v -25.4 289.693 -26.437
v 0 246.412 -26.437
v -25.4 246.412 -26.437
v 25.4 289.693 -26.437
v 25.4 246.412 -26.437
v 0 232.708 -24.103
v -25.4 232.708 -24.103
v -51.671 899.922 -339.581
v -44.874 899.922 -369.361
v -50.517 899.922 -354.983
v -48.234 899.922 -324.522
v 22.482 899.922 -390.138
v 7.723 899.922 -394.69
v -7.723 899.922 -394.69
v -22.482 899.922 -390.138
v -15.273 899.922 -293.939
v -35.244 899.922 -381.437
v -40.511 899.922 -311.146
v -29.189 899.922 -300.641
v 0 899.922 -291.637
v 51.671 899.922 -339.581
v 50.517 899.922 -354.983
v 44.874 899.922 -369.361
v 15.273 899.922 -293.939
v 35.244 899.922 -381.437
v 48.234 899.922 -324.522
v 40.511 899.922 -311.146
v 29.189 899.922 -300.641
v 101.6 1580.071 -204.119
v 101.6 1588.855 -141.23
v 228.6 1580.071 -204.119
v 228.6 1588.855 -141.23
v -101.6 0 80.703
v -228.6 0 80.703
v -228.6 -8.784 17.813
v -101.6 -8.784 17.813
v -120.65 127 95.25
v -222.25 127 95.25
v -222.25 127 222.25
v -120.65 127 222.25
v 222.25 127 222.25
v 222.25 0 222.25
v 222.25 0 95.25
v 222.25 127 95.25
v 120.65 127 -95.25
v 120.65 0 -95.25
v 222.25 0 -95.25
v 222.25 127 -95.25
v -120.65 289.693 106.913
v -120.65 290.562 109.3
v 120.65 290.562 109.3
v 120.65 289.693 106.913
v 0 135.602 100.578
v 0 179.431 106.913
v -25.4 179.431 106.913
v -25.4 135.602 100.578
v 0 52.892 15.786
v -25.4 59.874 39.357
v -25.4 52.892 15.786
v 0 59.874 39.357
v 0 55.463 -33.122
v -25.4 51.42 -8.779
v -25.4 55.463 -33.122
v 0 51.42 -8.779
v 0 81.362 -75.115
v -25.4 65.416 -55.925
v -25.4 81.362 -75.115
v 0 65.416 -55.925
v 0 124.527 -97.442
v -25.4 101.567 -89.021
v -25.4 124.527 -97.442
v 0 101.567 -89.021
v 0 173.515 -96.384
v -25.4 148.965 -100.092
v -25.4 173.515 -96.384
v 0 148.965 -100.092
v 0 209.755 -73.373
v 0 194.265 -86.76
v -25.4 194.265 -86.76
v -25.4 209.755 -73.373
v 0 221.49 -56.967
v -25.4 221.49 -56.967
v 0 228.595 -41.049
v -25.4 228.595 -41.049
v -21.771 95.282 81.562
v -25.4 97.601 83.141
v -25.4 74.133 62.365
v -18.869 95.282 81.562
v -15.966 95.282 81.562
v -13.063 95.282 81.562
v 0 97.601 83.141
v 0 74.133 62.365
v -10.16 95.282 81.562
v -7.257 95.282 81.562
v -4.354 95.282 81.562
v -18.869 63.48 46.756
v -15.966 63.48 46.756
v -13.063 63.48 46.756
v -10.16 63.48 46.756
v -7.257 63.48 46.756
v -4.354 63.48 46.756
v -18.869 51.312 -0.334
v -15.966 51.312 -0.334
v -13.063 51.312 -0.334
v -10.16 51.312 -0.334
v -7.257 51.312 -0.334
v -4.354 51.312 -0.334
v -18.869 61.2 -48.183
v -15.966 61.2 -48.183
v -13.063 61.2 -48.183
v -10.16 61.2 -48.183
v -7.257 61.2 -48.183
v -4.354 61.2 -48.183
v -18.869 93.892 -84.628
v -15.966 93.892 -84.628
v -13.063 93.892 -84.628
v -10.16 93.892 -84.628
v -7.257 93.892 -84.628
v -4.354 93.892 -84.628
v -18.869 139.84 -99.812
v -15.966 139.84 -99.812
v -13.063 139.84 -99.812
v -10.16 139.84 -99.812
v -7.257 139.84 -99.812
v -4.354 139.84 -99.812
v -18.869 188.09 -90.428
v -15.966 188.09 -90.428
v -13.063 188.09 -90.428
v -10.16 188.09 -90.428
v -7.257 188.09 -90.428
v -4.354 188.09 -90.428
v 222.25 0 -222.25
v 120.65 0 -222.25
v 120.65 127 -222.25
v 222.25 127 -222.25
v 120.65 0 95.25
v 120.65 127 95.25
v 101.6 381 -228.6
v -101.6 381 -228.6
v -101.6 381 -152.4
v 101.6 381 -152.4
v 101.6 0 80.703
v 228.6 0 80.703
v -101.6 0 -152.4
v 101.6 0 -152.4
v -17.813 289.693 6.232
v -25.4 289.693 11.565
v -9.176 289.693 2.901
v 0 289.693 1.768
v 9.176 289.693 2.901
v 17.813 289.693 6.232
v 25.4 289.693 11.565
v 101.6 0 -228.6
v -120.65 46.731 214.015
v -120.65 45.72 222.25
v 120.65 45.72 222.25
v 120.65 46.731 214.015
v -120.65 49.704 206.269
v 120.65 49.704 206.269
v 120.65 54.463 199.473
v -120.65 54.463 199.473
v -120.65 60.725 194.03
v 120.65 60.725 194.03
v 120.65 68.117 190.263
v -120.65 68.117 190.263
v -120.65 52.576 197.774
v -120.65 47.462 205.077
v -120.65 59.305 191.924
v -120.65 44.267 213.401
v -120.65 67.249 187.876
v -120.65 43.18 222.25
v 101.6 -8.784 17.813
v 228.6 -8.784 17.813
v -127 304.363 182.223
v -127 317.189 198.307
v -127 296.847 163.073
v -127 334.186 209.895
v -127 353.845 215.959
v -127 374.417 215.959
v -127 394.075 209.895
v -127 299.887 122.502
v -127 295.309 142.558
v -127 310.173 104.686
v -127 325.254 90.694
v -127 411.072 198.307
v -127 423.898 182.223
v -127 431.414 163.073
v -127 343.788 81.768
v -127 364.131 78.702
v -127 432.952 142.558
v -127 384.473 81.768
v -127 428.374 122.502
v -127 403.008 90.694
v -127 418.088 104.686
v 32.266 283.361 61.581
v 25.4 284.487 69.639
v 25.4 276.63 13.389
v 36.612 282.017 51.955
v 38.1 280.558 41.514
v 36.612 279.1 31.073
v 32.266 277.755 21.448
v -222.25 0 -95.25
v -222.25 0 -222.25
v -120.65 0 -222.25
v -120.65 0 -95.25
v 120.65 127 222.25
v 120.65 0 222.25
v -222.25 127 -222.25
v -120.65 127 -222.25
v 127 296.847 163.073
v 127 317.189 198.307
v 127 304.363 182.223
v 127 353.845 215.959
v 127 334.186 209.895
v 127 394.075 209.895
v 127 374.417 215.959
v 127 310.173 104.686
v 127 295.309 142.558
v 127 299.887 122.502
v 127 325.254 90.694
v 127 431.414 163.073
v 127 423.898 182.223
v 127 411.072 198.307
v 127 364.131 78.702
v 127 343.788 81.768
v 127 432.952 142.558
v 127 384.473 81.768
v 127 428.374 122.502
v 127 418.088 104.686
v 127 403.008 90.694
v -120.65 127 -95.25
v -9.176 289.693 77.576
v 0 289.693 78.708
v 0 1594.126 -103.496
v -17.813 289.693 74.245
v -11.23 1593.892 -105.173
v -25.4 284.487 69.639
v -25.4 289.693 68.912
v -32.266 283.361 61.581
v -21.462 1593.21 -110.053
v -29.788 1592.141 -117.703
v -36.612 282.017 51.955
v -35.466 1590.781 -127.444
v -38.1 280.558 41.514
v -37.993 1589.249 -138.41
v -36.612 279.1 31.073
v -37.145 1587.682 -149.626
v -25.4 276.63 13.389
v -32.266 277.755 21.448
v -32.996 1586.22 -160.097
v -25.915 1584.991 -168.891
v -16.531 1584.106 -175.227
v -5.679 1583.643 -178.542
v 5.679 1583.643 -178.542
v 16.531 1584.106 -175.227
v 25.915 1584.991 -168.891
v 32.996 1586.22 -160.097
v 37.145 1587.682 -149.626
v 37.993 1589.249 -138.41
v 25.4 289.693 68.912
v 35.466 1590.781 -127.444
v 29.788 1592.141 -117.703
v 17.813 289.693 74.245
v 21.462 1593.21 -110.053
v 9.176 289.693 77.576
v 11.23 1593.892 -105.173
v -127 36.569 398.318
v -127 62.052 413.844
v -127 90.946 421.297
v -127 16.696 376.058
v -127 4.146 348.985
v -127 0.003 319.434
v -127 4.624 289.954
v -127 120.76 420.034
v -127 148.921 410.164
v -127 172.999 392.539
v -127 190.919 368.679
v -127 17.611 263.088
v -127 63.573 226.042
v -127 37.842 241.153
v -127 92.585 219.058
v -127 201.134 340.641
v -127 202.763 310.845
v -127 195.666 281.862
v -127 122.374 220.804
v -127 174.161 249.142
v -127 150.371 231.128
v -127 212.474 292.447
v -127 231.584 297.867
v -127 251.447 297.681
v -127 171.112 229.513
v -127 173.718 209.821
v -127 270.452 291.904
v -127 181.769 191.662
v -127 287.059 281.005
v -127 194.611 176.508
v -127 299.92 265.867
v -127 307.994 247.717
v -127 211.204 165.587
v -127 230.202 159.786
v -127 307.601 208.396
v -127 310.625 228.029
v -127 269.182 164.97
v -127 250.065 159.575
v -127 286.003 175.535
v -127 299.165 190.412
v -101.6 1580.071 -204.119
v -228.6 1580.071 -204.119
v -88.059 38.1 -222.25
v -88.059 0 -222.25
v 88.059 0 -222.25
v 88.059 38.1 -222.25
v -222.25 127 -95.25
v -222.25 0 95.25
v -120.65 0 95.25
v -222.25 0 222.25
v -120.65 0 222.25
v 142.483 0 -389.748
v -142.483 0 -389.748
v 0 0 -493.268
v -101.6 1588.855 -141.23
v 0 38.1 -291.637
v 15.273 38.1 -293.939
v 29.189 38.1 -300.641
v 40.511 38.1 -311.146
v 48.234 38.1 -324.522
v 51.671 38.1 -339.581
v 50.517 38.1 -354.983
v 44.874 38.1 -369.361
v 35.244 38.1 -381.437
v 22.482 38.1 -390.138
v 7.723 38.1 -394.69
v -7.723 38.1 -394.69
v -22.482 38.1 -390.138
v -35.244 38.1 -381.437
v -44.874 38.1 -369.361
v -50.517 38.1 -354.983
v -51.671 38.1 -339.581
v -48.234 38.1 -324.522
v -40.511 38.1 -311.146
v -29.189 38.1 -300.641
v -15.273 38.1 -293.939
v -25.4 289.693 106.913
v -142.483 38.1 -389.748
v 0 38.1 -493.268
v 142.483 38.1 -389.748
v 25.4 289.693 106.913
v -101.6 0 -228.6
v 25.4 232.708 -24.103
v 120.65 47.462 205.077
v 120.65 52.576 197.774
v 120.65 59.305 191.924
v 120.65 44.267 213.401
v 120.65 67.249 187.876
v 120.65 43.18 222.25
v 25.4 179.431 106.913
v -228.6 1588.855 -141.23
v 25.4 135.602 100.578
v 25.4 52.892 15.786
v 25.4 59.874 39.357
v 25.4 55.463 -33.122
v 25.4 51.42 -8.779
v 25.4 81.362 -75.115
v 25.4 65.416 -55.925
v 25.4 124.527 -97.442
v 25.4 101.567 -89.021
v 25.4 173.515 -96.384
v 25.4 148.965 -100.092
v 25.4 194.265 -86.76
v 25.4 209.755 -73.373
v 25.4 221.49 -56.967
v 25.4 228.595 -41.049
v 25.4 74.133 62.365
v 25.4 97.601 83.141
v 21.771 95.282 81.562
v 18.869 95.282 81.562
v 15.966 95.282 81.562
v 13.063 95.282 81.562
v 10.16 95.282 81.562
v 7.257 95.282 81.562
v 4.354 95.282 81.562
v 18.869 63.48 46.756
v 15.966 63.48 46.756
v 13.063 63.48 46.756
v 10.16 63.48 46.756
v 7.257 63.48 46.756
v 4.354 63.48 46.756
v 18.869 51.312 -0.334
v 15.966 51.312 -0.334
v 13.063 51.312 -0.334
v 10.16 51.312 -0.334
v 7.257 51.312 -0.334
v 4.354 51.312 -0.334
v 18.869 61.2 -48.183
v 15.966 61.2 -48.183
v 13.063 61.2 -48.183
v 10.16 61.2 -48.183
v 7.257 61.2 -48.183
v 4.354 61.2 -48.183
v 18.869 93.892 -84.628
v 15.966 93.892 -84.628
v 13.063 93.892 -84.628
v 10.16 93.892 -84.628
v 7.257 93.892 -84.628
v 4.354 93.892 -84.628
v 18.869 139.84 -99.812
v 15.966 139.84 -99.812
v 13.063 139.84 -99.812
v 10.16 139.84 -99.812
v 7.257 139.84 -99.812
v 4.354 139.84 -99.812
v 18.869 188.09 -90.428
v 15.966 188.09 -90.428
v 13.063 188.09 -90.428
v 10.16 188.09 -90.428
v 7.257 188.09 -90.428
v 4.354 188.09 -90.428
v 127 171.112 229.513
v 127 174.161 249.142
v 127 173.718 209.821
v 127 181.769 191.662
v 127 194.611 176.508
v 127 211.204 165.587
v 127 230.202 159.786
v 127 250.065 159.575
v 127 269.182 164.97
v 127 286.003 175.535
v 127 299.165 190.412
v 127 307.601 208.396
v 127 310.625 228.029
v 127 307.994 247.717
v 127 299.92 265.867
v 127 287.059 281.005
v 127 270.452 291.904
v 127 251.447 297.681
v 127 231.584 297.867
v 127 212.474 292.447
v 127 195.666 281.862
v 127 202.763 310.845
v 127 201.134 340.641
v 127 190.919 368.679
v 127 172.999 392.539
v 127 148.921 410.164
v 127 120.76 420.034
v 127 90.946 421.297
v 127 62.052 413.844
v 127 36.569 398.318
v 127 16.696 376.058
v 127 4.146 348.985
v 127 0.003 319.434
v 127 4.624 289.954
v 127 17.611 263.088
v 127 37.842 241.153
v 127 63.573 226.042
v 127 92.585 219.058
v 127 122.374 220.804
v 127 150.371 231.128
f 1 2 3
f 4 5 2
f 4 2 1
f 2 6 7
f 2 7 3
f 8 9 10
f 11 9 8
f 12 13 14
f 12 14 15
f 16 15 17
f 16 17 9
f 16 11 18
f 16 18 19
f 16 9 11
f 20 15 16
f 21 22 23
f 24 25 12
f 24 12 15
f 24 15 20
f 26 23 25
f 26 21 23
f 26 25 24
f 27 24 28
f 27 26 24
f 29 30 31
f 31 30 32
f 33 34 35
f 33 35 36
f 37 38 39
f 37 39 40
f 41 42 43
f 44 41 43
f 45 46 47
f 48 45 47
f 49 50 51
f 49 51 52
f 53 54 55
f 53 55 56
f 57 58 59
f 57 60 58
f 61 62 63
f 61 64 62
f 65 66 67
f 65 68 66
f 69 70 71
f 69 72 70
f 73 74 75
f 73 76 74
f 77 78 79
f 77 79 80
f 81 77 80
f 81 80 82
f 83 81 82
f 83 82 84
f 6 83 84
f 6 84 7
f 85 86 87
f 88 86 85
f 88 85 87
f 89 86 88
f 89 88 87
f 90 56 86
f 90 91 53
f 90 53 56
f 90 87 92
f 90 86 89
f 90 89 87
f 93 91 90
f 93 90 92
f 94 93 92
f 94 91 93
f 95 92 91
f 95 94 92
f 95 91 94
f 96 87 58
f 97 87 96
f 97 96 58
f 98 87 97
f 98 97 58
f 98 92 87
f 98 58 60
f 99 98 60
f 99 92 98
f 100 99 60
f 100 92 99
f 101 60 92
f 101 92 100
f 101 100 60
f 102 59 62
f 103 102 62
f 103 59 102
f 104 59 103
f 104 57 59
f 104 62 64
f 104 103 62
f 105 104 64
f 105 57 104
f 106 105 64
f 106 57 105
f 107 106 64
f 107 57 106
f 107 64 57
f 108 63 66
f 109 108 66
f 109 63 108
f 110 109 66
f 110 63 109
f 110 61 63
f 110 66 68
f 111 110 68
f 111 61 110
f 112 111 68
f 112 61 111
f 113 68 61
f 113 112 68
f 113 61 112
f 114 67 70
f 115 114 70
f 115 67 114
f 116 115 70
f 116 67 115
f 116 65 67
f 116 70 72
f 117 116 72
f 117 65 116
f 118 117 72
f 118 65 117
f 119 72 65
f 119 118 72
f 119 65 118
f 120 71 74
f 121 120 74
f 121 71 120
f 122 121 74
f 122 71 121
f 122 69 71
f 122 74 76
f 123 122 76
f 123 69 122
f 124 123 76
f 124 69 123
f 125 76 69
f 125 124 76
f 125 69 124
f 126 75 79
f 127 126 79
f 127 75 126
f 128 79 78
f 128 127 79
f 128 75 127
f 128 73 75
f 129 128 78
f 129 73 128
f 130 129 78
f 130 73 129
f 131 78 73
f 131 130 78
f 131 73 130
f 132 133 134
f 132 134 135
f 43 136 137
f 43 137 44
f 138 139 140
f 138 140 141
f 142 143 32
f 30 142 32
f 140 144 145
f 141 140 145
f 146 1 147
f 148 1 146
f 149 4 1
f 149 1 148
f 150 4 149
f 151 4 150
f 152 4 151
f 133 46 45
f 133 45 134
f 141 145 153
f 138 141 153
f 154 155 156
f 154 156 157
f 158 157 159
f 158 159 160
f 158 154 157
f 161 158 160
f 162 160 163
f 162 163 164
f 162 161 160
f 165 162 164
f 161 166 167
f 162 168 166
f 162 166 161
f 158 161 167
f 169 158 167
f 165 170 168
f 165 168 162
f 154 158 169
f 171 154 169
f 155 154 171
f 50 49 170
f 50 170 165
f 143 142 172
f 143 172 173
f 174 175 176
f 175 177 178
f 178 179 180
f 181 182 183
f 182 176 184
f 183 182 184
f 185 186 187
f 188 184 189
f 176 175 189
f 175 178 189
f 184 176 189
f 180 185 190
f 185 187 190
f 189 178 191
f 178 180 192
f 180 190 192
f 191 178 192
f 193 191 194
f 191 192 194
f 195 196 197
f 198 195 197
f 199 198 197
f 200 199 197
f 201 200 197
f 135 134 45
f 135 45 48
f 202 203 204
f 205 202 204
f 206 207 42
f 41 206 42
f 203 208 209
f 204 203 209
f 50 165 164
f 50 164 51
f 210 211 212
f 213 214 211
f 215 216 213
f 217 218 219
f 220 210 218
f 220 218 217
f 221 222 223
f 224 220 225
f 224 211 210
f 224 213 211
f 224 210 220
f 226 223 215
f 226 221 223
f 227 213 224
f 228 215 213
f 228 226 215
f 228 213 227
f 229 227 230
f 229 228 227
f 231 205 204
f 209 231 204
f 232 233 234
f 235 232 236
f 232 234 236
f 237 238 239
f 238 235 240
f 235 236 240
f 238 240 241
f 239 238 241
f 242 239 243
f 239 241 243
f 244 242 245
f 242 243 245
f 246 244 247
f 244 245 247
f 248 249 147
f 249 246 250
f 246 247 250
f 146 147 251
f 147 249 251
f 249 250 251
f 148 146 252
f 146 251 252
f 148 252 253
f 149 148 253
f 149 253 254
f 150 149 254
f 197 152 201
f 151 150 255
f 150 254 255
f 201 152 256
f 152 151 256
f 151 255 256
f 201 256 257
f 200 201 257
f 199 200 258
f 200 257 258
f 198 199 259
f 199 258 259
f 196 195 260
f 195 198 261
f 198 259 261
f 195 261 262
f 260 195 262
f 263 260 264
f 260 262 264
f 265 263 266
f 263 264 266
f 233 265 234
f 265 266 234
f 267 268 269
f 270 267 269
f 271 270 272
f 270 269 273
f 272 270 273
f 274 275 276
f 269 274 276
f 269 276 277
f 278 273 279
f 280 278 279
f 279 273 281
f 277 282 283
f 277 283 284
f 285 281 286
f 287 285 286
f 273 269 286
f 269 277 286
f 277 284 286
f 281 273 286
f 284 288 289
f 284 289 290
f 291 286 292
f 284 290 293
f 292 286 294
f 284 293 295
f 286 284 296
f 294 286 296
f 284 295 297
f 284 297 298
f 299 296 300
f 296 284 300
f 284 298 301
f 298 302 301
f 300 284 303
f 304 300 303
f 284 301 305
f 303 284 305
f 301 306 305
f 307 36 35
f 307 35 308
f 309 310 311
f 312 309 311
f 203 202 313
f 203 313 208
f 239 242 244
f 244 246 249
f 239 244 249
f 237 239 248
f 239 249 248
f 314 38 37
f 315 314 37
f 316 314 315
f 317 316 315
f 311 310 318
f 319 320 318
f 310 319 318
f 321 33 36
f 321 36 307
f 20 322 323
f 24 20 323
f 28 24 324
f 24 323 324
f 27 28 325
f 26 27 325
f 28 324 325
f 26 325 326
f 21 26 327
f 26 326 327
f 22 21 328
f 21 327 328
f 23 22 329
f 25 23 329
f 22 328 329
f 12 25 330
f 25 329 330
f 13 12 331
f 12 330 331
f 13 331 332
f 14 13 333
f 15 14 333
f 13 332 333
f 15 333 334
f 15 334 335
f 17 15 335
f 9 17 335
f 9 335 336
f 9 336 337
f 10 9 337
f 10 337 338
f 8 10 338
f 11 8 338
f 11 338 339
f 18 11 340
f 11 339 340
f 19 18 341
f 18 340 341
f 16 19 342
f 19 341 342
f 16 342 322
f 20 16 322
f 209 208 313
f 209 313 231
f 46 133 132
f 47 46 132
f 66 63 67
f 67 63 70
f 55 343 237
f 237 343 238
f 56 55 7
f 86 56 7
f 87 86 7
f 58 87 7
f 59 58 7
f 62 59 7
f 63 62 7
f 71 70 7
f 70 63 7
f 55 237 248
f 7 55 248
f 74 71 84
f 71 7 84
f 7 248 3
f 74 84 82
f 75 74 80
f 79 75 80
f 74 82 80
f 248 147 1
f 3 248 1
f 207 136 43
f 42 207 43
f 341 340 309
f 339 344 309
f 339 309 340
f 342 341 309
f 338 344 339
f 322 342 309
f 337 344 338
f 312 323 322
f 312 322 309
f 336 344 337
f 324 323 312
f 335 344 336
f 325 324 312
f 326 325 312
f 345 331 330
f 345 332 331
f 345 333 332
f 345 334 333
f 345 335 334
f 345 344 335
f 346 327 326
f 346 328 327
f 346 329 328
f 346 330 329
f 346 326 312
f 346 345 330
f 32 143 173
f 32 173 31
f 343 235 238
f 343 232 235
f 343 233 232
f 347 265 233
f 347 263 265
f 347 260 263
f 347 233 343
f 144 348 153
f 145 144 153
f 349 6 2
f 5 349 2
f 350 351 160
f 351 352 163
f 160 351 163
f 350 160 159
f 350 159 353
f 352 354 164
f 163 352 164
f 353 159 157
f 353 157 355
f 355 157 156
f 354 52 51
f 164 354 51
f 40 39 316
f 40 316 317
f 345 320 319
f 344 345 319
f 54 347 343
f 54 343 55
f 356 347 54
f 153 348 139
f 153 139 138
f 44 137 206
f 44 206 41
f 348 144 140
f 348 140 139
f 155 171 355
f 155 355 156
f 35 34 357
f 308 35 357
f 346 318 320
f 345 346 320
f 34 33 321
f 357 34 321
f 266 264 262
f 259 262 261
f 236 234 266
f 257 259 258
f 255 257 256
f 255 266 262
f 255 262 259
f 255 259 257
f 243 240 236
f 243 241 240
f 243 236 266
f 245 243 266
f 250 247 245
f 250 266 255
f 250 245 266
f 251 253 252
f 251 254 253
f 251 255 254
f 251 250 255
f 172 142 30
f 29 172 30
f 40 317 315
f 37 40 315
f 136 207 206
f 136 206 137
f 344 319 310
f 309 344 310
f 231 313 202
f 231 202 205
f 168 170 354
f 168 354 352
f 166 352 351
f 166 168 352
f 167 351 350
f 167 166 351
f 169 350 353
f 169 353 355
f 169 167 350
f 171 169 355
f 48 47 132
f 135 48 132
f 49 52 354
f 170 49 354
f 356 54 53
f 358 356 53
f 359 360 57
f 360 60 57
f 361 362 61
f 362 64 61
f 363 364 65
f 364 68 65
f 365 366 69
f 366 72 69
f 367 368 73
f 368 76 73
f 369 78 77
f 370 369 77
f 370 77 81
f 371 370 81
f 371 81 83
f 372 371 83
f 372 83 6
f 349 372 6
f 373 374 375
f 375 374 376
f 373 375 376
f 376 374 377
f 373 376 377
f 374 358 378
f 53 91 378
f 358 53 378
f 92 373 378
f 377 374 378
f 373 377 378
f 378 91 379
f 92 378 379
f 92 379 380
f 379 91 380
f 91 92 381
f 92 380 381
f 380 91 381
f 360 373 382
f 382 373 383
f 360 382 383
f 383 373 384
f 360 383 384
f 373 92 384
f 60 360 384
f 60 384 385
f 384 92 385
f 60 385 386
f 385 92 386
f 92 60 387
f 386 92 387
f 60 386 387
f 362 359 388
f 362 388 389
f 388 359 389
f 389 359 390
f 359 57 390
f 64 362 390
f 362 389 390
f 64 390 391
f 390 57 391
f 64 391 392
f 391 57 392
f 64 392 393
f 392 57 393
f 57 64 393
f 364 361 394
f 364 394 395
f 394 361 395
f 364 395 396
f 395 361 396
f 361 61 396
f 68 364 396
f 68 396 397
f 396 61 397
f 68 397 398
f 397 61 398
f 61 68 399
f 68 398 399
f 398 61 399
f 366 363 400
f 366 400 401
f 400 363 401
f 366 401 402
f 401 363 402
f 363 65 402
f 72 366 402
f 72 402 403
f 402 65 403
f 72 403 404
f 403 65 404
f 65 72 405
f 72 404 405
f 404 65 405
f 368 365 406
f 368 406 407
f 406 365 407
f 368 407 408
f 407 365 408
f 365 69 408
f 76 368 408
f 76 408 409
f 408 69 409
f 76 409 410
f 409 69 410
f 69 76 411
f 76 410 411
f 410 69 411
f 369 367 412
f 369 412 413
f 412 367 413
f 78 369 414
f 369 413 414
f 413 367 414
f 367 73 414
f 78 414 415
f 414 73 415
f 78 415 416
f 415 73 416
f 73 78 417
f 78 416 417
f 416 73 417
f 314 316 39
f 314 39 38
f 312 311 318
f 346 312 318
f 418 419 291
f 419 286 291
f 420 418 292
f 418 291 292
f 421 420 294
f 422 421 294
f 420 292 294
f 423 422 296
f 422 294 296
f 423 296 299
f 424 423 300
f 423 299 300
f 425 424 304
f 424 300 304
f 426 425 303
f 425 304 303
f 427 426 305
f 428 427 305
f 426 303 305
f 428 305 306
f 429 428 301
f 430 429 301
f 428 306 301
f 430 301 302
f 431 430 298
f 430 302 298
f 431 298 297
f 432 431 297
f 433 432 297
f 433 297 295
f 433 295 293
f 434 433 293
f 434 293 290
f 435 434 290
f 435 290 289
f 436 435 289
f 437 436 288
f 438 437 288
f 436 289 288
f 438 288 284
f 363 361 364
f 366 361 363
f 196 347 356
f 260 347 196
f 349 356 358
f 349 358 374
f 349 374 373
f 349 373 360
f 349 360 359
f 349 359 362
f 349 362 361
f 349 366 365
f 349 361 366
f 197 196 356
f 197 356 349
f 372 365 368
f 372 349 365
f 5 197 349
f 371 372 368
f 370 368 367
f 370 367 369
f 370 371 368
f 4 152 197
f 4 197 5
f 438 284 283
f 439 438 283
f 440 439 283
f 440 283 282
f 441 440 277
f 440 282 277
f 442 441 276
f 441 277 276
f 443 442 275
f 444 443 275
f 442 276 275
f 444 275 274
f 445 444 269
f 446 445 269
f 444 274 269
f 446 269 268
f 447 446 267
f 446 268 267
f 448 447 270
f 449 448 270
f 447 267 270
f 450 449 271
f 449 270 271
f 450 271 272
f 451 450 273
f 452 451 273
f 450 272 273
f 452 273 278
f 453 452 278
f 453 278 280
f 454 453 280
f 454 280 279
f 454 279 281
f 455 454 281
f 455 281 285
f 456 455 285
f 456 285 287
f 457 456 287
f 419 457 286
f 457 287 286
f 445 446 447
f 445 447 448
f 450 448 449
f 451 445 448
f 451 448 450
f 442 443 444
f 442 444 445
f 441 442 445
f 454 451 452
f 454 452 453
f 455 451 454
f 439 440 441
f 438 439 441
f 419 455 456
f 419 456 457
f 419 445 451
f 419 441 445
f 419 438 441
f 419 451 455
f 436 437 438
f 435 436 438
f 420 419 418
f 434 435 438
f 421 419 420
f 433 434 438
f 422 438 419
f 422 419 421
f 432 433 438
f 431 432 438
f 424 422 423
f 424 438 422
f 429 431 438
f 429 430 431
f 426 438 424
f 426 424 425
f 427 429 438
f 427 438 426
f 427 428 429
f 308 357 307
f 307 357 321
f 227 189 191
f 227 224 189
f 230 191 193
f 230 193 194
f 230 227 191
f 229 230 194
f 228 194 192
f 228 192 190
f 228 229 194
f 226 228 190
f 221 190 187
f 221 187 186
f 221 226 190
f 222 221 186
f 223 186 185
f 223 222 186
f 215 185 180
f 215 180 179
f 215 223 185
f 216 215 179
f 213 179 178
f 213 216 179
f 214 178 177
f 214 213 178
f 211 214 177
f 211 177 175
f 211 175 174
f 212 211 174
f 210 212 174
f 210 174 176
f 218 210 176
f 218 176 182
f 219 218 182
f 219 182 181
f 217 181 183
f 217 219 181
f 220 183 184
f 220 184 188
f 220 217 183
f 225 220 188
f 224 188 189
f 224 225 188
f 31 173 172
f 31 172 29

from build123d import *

# Parameters (mm, degrees)
SKETCH1_W           = 101.6
SKETCH1_H           = 127
DRIVETRAIN_DEPTH    = 127
DRIVETRAIN_2_DEPTH  = 127
DRIVETRAIN_3_DEPTH  = 127
DRIVETRAIN_4_DEPTH  = 127
BOSS_EXTRUDE2_DEPTH = 38.1
SKETCH4_R           = 51.816
BOSS_EXTRUDE3_DEPTH = 861.822
BOSS_EXTRUDE4_DEPTH = 25.4
SKETCH7_W           = 1320.998239158
SKETCH7_H           = 38.1
BOSS_EXTRUDE5_DEPTH = 241.3
SKETCH12_R          = 101.6
SKETCH12_R_2        = 69.760716059
SKETCH12_R_3        = 69.014032316
BOSS_EXTRUDE8_DEPTH = 127
SKETCH9_W           = 1604.28012948
SKETCH9_H           = 127
LIFT_DEPTH          = 63.5
LIFT_2_DEPTH        = 63.5
SKETCH10_W          = 203.2
SKETCH10_H          = 76.2
GOAL_LIFT_DEPTH     = 381


with BuildPart() as part:
    # Sketch1 → Drivetrain (new body)
    with BuildSketch(Plane(origin=(0, 0, 0), x_dir=(1, 0, 0), z_dir=(0, 1, 0))):
        with Locations((-171.45, -158.75)):
            Rectangle(SKETCH1_W, SKETCH1_H)
    extrude(amount=DRIVETRAIN_DEPTH)


with BuildPart() as body_2:
    # Sketch1 → Drivetrain 2 (new body)
    with BuildSketch(Plane(origin=(0, 0, 0), x_dir=(1, 0, 0), z_dir=(0, 1, 0))):
        with Locations((171.45, -158.75)):
            Rectangle(SKETCH1_W, SKETCH1_H)
    extrude(amount=DRIVETRAIN_2_DEPTH)


with BuildPart() as body_3:
    # Sketch1 → Drivetrain 3 (new body)
    with BuildSketch(Plane(origin=(0, 0, 0), x_dir=(1, 0, 0), z_dir=(0, 1, 0))):
        with Locations((171.45, 158.75)):
            Rectangle(SKETCH1_W, SKETCH1_H)
    extrude(amount=DRIVETRAIN_3_DEPTH)


with BuildPart() as body_4:
    # Sketch1 → Drivetrain 4 (new body)
    with BuildSketch(Plane(origin=(0, 0, 0), x_dir=(1, 0, 0), z_dir=(0, 1, 0))):
        with Locations((-171.45, 158.75)):
            Rectangle(SKETCH1_W, SKETCH1_H)
    extrude(amount=DRIVETRAIN_4_DEPTH)


with BuildPart() as body_5:
    # Sketch3 → Boss-Extrude2 (new body)
    with BuildSketch(Plane(origin=(0, 0, 0), x_dir=(1, 0, 0), z_dir=(0, 1, 0))):
        Polygon((-88.059086234, 222.25), (88.059086234, 222.25), (142.482594544, 389.748335563), (0, 493.268), (-142.482594544, 389.748335563), align=None)
    extrude(amount=BOSS_EXTRUDE2_DEPTH)

    # Sketch4 → Boss-Extrude3 (add)
    with BuildSketch(Plane(origin=(0, 38.1, 0), x_dir=(1, 0, 0), z_dir=(0, 1, 0))):
        with Locations(Location((0, 343.452934225, 0), (0, 0, 270))):
            Circle(SKETCH4_R)
    extrude(amount=BOSS_EXTRUDE3_DEPTH)


with BuildPart() as body_6:
    # Sketch5 → Boss-Extrude4 (new, symmetric)
    with BuildSketch(Plane(origin=(0, 0, 0), x_dir=(0, 0, -1), z_dir=(1, 0, 0))):
        with BuildLine():
            Line((26.436715133, 289.693154062), (-106.913284867, 289.693154062))
            Line((-106.913284867, 289.693154062), (-106.913284867, 179.431240311))
            add(Edge.make_bspline(
                [(-106.913284867, 179.431240311), (-106.922275514, 177.314085183), (-106.844714825, 173.100022171), (-106.31155836, 164.517909306), (-104.937916384, 153.66518019), (-102.147116697, 140.558434457), (-96.860695677, 123.207488958), (-89.140150055, 106.380193996), (-78.695792066, 90.878883106), (-69.408123184, 80.167132386), (-60.386249114, 72.245634114), (-52.39130403, 66.691297247), (-45.99151885, 62.954859956), (-39.278923957, 59.736475089), (-30.06602637, 56.16180659), (-18.118136003, 52.977720447), (-3.39072609, 51.139329122), (11.470537994, 51.257526659), (26.208790933, 53.358691633), (40.552465987, 57.527924547), (54.195009809, 63.874750123), (66.720940218, 72.636610137), (77.279681687, 83.231040861), (85.929191733, 95.271807521), (92.611384836, 108.432594601), (97.298063179, 122.436261075), (99.919873761, 137.026968228), (100.385639212, 151.895462865), (98.543779565, 166.759173971), (94.887371789, 178.859467795), (90.553070433, 188.137455125), (85.218361014, 197.037872982), (77.080983632, 206.845723087), (65.529417153, 216.561483785), (52.63591563, 224.204406044), (38.758572394, 229.748850977), (29.019813004, 231.986328043), (24.102701524, 232.707697092)],
                knots=[0.074418032, 0.074418032, 0.074418032, 0.074418032, 0.088878632, 0.103339233, 0.132260434, 0.161181635, 0.190102836, 0.247945239, 0.27686644, 0.305787641, 0.334708842, 0.349169443, 0.363630043, 0.378090644, 0.392551244, 0.421472445, 0.450393647, 0.479314848, 0.508236049, 0.53715725, 0.566078451, 0.594999652, 0.623920853, 0.652842055, 0.681763256, 0.710684457, 0.739605658, 0.768526859, 0.79744806, 0.826369261, 0.840829862, 0.855290463, 0.884211664, 0.913132865, 0.942054066, 0.970975267, 0.999896468, 0.999896468, 0.999896468, 0.999896468], degree=3))
            add(Edge.make_bspline(
                [(24.102701524, 232.707697092), (24.382820632, 233.837593719), (24.896858704, 236.10272623), (25.436705696, 238.986704891), (25.806838001, 241.318987531), (26.012617854, 242.784257474), (26.163008004, 243.969909968), (26.249075931, 244.697044834), (26.318182296, 245.318086319), (26.370408001, 245.802218308), (26.410286896, 246.168265776), (26.436715133, 246.411642205)],
                knots=[-0.022894974, -0.022894974, -0.022894974, -0.022894974, 0.042322725, 0.107540425, 0.140149275, 0.172758125, 0.18906255, 0.205366975, 0.213519187, 0.2216714, 0.237975825, 0.237975825, 0.237975825, 0.237975825], degree=3))
            Line((26.436715133, 246.411642205), (26.436715133, 289.693154062))
        make_face()
    extrude(amount=BOSS_EXTRUDE4_DEPTH, both=True)

    # Sketch7 → Revolve1 (revolve)
    with BuildSketch(Plane(origin=(0, 11.056920966, 79.158440361), x_dir=(0, 0.9903850942141906, -0.13833786595993453), z_dir=(0, -0.13833786595993453, -0.9903850942141906)), mode=Mode.PRIVATE) as revolve1_sk:
        with Locations((932.616745586, 19.05)):
            Rectangle(SKETCH7_W, SKETCH7_H)
    revolve(revolve1_sk.sketch.rotate(Axis((0, 1588.855127182, -141.229808653), (0, -0.9903850942141906, 0.1383378659599345)), 90), axis=Axis((0, 1588.855127182, -141.229808653), (0, -0.9903850942141906, 0.1383378659599345)))


with BuildPart() as body_7:
    # Sketch8 → Boss-Extrude5 (new body)
    with BuildSketch(Plane(origin=(-120.65, 0, 0), x_dir=(0, 0, -1), z_dir=(1, 0, 0))):
        with BuildLine():
            Line((-106.913284867, 289.693154062), (-187.876482837, 67.248595832))
            ThreePointArc((-187.876482837, 67.248595832), (-201.26884186, 49.795333751), (-222.25, 43.18))
            Line((-222.25, 43.18), (-222.25, 45.72))
            ThreePointArc((-222.25, 45.72), (-202.725726009, 51.875979943), (-190.263302094, 68.117326996))
            Line((-190.263302094, 68.117326996), (-109.300104124, 290.561885226))
            Line((-109.300104124, 290.561885226), (-106.913284867, 289.693154062))
        make_face()
    extrude(amount=BOSS_EXTRUDE5_DEPTH)


with BuildPart() as body_8:
    # Sketch12 → Boss-Extrude8 (new, symmetric)
    with BuildSketch(Plane(origin=(0, 0, 0), x_dir=(0, 0, -1), z_dir=(1, 0, 0))):
        with Locations((-320.257176019, 101.6)):
            Circle(SKETCH12_R)
        with Locations((-228.726819478, 240.868027394)):
            Circle(SKETCH12_R_2)
        with Locations((-147.71567639, 364.130544019)):
            Circle(SKETCH12_R_3)
    extrude(amount=BOSS_EXTRUDE8_DEPTH, both=True)


with BuildPart() as body_9:
    # Sketch9 → Lift (new body)
    with BuildSketch(Plane(origin=(0, 11.056920966, 79.158440361), x_dir=(0, 0.9903850942141906, -0.13833786595993453), z_dir=(0, -0.13833786595993453, -0.9903850942141906))):
        with Locations((790.975800425, 165.1)):
            Rectangle(SKETCH9_W, SKETCH9_H)
    extrude(amount=LIFT_DEPTH)


with BuildPart() as body_10:
    # Sketch9 → Lift 2 (new body)
    with BuildSketch(Plane(origin=(0, 11.056920966, 79.158440361), x_dir=(0, 0.9903850942141906, -0.13833786595993453), z_dir=(0, -0.13833786595993453, -0.9903850942141906))):
        with Locations((790.975800425, -165.1)):
            Rectangle(SKETCH9_W, SKETCH9_H)
    extrude(amount=LIFT_2_DEPTH)


with BuildPart() as body_11:
    # Sketch10 → Goal Lift (new body)
    with BuildSketch(Plane(origin=(0, 0, 0), x_dir=(1, 0, 0), z_dir=(0, 1, 0))):
        with Locations((0, 190.5)):
            Rectangle(SKETCH10_W, SKETCH10_H)
    extrude(amount=GOAL_LIFT_DEPTH)


solid = Compound([part.part, body_2.part, body_3.part, body_4.part, body_5.part, body_6.part, body_7.part, body_8.part, body_9.part, body_10.part, body_11.part])
